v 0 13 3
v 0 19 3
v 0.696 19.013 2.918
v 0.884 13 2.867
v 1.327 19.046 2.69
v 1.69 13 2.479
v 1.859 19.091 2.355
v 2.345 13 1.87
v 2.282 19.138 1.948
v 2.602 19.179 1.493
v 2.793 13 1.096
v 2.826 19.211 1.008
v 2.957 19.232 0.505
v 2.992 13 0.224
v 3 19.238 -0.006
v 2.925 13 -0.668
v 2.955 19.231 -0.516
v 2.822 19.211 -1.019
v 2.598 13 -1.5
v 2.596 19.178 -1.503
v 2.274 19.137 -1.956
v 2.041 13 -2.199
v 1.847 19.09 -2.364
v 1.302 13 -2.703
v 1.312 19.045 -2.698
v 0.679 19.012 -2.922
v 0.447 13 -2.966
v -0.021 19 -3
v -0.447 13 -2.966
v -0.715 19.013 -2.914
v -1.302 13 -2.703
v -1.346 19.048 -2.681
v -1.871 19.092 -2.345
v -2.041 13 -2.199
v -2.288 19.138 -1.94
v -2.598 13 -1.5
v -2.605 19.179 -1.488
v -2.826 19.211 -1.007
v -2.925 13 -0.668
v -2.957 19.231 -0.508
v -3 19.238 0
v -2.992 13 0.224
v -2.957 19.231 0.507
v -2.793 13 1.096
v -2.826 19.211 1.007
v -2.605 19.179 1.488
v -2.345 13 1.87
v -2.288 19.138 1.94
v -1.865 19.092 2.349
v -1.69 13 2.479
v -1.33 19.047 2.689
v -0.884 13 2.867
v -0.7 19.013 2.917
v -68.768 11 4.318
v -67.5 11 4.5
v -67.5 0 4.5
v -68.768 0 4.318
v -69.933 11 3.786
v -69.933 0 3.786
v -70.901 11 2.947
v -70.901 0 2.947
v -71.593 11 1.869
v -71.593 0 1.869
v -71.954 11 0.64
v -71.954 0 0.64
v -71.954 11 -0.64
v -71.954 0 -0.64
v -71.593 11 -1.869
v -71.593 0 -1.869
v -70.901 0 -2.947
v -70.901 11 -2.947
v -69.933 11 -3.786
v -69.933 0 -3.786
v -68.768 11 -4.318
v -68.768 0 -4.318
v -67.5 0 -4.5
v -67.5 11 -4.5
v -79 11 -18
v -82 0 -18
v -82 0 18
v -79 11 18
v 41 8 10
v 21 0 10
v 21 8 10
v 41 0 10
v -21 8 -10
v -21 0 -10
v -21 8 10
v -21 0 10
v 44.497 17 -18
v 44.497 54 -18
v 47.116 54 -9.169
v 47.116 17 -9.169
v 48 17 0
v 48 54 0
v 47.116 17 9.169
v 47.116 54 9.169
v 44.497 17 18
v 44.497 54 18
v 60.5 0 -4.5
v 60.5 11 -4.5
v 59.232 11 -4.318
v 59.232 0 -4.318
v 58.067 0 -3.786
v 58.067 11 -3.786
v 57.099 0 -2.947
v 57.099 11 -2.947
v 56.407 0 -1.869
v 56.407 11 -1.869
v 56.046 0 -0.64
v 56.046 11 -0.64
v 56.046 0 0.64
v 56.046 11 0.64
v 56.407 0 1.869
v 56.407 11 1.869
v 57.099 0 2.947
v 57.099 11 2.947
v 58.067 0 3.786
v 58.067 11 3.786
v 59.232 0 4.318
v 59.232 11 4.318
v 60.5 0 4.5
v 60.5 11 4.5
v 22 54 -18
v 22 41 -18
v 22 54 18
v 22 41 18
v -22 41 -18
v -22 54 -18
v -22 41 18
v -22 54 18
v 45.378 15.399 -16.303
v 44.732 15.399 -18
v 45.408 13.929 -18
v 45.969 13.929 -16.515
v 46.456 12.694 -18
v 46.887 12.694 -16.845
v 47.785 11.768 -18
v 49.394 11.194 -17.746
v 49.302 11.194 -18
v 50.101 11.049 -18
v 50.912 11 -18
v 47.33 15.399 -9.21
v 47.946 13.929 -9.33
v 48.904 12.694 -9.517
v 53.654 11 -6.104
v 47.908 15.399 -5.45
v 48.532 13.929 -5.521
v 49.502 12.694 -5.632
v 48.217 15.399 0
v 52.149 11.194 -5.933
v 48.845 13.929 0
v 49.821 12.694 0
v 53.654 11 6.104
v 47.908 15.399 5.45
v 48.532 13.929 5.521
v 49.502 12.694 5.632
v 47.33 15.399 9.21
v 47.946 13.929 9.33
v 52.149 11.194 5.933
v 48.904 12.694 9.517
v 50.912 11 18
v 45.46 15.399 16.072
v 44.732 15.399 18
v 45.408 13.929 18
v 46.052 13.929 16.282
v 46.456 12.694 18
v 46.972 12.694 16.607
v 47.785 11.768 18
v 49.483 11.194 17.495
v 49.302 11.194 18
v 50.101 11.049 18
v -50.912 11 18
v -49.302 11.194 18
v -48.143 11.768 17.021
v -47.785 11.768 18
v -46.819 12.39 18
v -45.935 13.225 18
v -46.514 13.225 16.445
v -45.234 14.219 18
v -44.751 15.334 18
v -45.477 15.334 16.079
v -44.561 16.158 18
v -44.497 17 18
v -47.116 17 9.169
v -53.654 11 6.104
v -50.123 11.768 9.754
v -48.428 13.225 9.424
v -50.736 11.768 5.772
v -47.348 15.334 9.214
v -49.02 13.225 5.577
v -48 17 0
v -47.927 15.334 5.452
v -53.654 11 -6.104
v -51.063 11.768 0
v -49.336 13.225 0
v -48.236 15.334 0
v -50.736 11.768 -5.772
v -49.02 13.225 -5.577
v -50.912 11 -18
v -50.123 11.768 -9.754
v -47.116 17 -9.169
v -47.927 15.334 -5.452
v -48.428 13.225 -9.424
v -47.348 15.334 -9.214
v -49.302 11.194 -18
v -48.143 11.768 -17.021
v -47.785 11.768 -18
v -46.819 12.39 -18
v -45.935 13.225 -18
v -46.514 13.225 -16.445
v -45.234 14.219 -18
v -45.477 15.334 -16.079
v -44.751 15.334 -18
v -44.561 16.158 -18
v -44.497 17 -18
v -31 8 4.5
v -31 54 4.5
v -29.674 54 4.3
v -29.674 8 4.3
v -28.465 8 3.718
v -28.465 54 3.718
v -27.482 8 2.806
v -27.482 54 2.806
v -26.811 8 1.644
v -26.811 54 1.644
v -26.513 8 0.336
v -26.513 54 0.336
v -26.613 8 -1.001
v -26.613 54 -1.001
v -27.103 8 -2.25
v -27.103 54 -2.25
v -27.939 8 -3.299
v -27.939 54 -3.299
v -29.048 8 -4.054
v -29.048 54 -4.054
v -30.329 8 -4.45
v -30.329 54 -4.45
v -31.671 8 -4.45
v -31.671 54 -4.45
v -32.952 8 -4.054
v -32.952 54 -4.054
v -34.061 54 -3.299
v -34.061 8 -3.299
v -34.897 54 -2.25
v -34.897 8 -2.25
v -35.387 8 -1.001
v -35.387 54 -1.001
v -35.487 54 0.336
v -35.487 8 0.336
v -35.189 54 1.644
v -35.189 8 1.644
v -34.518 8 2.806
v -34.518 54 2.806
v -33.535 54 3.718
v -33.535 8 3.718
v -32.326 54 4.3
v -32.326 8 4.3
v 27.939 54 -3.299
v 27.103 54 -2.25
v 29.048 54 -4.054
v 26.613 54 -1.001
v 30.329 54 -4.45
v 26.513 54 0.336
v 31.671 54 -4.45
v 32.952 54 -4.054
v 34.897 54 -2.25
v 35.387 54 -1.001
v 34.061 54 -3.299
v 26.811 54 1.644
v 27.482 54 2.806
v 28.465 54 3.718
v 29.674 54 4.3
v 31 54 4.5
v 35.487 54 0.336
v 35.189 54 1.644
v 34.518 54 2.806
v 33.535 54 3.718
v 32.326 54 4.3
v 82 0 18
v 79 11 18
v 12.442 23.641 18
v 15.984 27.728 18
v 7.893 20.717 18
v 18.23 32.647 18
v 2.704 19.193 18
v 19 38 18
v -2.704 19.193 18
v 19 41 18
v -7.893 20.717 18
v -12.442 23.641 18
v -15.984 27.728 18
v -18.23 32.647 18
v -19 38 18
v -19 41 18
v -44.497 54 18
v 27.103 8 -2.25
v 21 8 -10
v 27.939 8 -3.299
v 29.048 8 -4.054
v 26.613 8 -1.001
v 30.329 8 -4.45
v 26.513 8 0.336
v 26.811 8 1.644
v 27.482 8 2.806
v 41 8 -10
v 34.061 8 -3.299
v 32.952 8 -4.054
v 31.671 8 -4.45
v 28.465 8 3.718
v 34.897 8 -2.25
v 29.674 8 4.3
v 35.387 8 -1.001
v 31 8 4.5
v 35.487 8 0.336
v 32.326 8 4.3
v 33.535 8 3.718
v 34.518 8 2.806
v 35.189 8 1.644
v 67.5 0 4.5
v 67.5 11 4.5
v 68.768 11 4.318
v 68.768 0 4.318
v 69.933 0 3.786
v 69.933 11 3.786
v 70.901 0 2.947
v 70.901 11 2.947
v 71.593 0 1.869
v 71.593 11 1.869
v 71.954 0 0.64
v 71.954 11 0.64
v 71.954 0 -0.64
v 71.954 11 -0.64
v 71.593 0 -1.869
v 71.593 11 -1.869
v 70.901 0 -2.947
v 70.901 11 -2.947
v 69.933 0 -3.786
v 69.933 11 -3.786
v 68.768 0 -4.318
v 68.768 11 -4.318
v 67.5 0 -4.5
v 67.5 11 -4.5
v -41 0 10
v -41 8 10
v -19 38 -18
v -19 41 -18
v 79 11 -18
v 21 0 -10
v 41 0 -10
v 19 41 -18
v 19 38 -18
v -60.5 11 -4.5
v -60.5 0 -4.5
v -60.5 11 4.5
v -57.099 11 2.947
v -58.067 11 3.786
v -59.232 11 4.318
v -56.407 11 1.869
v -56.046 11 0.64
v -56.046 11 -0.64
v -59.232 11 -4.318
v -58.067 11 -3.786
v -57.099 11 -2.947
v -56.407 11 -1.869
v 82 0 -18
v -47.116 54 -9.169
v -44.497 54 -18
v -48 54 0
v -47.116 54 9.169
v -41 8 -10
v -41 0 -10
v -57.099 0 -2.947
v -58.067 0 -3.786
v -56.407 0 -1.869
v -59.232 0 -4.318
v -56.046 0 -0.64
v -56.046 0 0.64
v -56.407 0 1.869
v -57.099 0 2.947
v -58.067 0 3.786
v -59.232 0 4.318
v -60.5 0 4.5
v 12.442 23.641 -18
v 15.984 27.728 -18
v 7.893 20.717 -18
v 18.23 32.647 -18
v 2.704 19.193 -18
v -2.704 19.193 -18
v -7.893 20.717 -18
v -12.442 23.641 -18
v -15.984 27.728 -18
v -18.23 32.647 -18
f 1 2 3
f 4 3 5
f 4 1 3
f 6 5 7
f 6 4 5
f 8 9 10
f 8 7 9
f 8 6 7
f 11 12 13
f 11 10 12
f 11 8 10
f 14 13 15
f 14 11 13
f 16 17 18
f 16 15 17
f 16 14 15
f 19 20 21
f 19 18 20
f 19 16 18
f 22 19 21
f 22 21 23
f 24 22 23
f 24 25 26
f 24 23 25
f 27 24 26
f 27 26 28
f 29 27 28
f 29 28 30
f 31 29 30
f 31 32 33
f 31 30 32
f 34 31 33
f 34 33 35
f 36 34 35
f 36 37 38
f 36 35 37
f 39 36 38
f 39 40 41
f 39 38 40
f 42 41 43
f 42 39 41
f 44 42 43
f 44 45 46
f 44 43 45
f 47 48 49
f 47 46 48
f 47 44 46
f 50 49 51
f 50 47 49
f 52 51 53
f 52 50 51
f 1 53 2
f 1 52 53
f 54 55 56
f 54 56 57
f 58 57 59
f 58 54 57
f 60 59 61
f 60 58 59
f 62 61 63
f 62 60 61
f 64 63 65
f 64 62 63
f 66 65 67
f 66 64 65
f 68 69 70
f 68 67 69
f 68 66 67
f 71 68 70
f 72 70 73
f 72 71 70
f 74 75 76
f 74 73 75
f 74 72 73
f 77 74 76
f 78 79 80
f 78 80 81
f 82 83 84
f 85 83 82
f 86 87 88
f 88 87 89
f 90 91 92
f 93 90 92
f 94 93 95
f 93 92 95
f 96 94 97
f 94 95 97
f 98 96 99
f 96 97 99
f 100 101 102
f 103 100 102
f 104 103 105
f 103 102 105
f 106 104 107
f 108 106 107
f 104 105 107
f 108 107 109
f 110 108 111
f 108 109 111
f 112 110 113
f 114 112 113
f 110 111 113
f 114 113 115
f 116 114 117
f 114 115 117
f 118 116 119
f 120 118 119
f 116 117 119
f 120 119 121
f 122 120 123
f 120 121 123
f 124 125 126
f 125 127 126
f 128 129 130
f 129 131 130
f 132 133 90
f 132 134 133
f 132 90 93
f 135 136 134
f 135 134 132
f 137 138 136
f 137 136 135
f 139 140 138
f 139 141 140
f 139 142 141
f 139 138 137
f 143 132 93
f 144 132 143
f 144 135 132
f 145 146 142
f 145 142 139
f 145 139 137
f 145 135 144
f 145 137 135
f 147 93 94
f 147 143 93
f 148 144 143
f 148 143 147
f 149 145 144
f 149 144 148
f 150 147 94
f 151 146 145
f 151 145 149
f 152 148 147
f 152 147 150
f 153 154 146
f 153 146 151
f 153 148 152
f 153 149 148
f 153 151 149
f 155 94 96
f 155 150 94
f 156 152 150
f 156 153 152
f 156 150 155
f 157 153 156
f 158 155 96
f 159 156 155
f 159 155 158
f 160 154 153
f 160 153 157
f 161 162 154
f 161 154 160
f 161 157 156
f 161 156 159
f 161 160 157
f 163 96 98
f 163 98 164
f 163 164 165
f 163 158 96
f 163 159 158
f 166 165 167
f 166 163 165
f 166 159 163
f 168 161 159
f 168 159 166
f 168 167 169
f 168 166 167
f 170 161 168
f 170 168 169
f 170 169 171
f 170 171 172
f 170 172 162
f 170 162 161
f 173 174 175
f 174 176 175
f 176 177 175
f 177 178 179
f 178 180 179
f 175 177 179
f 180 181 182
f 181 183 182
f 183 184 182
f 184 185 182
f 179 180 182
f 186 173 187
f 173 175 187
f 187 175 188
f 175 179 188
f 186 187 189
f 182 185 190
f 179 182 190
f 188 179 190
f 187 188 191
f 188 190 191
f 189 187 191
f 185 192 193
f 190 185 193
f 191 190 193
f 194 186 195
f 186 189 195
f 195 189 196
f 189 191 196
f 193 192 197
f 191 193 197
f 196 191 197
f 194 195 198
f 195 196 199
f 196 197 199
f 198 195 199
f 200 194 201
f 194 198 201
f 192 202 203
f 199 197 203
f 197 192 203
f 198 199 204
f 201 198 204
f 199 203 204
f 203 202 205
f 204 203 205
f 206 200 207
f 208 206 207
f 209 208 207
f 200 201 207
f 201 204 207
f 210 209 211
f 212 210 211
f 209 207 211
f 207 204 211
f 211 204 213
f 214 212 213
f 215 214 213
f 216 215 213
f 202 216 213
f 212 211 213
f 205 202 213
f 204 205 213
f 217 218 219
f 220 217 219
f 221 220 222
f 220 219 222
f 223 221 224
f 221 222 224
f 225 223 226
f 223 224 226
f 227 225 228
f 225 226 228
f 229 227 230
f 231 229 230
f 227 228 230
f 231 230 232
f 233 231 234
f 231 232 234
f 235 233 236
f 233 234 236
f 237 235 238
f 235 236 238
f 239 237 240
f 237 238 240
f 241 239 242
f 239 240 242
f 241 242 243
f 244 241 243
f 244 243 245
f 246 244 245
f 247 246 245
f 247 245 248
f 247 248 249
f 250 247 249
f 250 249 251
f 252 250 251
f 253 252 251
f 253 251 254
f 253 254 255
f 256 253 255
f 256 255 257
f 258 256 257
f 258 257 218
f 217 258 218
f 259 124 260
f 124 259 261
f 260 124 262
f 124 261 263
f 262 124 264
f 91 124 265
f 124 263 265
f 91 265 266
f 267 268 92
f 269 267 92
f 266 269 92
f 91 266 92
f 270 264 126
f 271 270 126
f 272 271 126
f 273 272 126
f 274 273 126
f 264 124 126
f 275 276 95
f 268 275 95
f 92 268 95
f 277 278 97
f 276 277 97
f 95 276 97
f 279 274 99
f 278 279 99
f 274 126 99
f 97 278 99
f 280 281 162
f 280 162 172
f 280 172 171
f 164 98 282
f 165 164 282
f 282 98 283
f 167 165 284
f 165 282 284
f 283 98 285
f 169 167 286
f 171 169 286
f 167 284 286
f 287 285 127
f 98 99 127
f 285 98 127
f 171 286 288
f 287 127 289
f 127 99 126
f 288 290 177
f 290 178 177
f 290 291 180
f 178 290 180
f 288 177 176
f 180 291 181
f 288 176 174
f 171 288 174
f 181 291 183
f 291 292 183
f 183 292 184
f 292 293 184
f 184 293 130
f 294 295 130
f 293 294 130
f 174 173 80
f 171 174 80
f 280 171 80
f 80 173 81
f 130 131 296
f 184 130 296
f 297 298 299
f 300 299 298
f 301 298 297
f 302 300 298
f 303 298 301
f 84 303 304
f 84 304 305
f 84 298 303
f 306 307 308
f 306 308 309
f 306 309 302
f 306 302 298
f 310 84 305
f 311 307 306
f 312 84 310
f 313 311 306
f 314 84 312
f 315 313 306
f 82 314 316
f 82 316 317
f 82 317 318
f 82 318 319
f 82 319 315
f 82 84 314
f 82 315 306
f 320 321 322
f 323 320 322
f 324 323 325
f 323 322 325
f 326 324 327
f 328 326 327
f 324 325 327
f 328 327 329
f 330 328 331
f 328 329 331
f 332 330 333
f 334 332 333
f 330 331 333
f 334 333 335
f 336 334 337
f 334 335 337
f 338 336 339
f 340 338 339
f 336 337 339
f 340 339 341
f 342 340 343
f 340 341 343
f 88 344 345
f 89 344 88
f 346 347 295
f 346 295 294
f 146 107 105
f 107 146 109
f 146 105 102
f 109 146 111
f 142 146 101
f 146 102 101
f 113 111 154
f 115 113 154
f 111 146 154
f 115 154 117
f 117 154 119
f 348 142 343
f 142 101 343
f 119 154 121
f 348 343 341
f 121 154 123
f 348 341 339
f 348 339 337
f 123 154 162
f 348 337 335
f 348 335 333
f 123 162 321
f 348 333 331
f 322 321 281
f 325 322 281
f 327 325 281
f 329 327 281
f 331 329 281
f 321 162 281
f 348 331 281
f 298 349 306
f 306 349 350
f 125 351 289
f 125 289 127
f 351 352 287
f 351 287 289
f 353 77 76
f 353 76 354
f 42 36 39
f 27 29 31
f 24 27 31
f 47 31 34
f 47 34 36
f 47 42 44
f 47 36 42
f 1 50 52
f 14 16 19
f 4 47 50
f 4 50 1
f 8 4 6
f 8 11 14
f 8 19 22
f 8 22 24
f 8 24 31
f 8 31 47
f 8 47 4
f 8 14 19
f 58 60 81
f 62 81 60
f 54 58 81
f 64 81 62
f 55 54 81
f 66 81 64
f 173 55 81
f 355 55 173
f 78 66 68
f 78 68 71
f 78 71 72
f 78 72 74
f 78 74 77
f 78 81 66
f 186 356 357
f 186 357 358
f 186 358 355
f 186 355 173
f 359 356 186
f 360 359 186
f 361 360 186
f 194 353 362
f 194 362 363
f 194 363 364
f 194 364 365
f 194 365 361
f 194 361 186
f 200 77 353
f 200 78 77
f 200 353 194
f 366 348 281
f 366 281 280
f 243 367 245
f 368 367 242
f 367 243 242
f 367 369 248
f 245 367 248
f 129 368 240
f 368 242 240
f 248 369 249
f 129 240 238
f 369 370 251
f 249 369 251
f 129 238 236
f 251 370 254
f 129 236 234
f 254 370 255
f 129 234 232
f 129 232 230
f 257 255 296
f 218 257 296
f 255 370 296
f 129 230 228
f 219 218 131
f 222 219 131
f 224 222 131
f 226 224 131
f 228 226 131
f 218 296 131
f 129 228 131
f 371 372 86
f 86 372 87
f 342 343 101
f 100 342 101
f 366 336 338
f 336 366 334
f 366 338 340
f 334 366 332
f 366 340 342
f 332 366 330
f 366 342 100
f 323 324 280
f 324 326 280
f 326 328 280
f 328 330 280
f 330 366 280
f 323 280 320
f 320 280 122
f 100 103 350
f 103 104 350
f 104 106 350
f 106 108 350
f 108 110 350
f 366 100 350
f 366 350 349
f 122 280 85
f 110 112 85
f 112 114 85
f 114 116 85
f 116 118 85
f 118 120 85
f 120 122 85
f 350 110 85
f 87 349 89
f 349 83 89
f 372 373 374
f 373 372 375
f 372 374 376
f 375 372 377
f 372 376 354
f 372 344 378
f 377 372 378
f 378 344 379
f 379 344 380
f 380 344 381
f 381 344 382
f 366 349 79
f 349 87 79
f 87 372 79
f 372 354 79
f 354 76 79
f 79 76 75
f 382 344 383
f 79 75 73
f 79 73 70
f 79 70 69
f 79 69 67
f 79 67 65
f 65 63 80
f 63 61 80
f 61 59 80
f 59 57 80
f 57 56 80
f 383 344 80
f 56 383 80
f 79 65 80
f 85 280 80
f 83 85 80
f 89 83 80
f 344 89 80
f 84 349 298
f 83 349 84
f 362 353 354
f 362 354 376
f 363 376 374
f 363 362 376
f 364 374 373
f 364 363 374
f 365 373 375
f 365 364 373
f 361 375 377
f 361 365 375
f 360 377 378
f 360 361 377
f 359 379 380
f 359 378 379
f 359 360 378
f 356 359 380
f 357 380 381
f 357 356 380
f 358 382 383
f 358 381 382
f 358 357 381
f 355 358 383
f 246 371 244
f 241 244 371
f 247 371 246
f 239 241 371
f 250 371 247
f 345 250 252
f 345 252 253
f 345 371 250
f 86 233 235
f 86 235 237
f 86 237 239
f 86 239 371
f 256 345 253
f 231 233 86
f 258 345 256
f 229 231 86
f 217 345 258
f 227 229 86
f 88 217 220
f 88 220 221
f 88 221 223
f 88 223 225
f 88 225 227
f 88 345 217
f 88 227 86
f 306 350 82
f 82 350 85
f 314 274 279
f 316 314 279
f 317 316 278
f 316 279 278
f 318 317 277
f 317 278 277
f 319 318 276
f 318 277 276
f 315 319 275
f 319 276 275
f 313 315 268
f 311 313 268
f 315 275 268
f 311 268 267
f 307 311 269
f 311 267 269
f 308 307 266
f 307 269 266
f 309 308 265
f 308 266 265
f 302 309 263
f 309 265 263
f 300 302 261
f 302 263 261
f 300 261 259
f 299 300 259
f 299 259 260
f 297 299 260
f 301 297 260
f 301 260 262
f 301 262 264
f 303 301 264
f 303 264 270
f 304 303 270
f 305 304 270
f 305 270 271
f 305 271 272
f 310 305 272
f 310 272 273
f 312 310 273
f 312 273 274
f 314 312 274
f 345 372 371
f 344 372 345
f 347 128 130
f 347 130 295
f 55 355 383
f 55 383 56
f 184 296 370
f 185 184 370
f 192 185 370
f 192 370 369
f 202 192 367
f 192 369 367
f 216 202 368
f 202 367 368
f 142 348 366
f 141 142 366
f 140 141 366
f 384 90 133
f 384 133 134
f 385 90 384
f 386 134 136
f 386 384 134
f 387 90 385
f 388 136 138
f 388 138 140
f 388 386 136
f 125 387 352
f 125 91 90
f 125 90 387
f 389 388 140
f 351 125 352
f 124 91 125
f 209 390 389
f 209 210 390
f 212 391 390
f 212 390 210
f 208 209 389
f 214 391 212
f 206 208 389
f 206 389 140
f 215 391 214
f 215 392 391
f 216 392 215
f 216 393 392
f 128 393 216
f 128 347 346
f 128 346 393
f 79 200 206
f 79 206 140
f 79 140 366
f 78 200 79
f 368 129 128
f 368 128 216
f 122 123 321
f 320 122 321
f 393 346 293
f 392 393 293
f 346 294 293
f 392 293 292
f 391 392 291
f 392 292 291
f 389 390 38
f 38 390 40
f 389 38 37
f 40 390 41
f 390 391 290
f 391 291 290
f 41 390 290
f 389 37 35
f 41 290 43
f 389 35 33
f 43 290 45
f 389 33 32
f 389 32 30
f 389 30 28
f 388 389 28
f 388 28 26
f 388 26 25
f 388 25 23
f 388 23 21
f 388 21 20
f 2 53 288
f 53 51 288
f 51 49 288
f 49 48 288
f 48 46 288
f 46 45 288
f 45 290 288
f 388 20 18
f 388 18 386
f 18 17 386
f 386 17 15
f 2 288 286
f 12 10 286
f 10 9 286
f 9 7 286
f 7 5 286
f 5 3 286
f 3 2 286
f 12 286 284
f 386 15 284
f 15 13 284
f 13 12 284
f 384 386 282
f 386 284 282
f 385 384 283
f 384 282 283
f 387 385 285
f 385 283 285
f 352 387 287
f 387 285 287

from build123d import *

# Parameters (mm, degrees)
BOSS_EXTRUDE1_DEPTH = 18
CUT_EXTRUDE1_DEPTH  = 43
SKETCH12_W          = 20
SKETCH12_H          = 20
CUT_EXTRUDE2_DEPTH  = 8
SKETCH13_R          = 4.5
CUT_EXTRUDE3_DEPTH  = 55
CUT_EXTRUDE4_DEPTH  = 12
CUT_EXTRUDE8_START  = -6
SKETCH18_R          = 3
CUT_EXTRUDE8_DEPTH  = 6.238337
FILLET1_R           = 6


with BuildPart() as part:
    # Sketch1 → Boss-Extrude1 (new body, symmetric)
    with BuildSketch(Plane.XY):
        with BuildLine():
            Line((82, 0), (-82, 0))
            Line((-82, 0), (-79, 11))
            Line((-79, 11), (-49, 11))
            Line((-49, 11), (-49, 54))
            Line((-49, 54), (-22, 54))
            Line((-22, 54), (-22, 41))
            Line((-22, 41), (-19, 41))
            Line((-19, 41), (-19, 38))
            ThreePointArc((-19, 38), (0, 19), (19, 38))
            Line((19, 38), (19, 41))
            Line((19, 41), (22, 41))
            Line((22, 41), (22, 54))
            Line((22, 54), (49, 54))
            Line((49, 54), (49, 11))
            Line((49, 11), (79, 11))
            Line((79, 11), (82, 0))
        make_face()
    extrude(amount=BOSS_EXTRUDE1_DEPTH, both=True)

    # Sketch3 → Cut-Extrude1 (cut)
    with BuildSketch(Plane(origin=(0, 54, 0), x_dir=(1, 0, 0), z_dir=(0, 1, 0))):
        with BuildLine():
            Line((-44.497190923, 18), (-49, 18))
            Line((-49, 18), (-49, -18))
            Line((-49, -18), (-44.497190923, -18))
            ThreePointArc((-44.497190923, -18), (-48, 0), (-44.497190923, 18))
        make_face()
        with BuildLine():
            Line((49, -18), (49, 18))
            Line((49, 18), (44.497190923, 18))
            ThreePointArc((44.497190923, 18), (48, 0), (44.497190923, -18))
            Line((44.497190923, -18), (49, -18))
        make_face()
    extrude(amount=-CUT_EXTRUDE1_DEPTH, mode=Mode.SUBTRACT)

    # Sketch12 → Cut-Extrude2 (cut)
    with BuildSketch(Plane.XZ):
        with Locations((-31, 0)):
            Rectangle(SKETCH12_W, SKETCH12_H)
        with Locations((31, 0)):
            Rectangle(SKETCH12_W, SKETCH12_H)
    extrude(amount=-CUT_EXTRUDE2_DEPTH, mode=Mode.SUBTRACT)

    # Sketch13 → Cut-Extrude3 (cut, through all)
    with BuildSketch(Plane(origin=(0, 54, 0), x_dir=(1, 0, 0), z_dir=(0, 1, 0))):
        with Locations(Location((-31, 0, 0), (0, 0, 270))):  # turned: the seam where the file's is
            Circle(SKETCH13_R)
        with Locations(Location((31, 0, 0), (0, 0, 270))):  # turned: the seam where the file's is
            Circle(SKETCH13_R)
    extrude(amount=-CUT_EXTRUDE3_DEPTH, mode=Mode.SUBTRACT)

    # Sketch14 → Cut-Extrude4 (cut, through all)
    with BuildSketch(Plane(origin=(0, 11, 0), x_dir=(1, 0, 0), z_dir=(0, 1, 0))):
        with BuildLine():
            Line((-67.5, 4.5), (-60.5, 4.5))
            ThreePointArc((-60.5, 4.5), (-56, 0), (-60.5, -4.5))
            Line((-60.5, -4.5), (-67.5, -4.5))
            ThreePointArc((-67.5, -4.5), (-72, 0), (-67.5, 4.5))
        make_face()
        with BuildLine():
            Line((67.5, 4.5), (60.5, 4.5))
            ThreePointArc((60.5, 4.5), (56, 0), (60.5, -4.5))
            Line((60.5, -4.5), (67.5, -4.5))
            ThreePointArc((67.5, -4.5), (72, 0), (67.5, 4.5))
        make_face()
    extrude(amount=-CUT_EXTRUDE4_DEPTH, mode=Mode.SUBTRACT)

    # Sketch18 → Cut-Extrude8 (cut)
    with BuildSketch(Plane(origin=(0, 19, 0), x_dir=(1, 0, 0), z_dir=(0, 1, 0)).offset(CUT_EXTRUDE8_START)):
        with Locations(Location((0, 0, 0), (0, 0, 270))):  # turned: the seam where the file's is
            Circle(SKETCH18_R)
    extrude(amount=CUT_EXTRUDE8_DEPTH, mode=Mode.SUBTRACT)

    # Fillet1
    fillet1_edges = [part.edges().sort_by_distance(p)[0] for p in [
        (-48, 11, 0),
        (48, 11, 0),
    ]]
    fillet(fillet1_edges, radius=FILLET1_R)


solid = part.part
